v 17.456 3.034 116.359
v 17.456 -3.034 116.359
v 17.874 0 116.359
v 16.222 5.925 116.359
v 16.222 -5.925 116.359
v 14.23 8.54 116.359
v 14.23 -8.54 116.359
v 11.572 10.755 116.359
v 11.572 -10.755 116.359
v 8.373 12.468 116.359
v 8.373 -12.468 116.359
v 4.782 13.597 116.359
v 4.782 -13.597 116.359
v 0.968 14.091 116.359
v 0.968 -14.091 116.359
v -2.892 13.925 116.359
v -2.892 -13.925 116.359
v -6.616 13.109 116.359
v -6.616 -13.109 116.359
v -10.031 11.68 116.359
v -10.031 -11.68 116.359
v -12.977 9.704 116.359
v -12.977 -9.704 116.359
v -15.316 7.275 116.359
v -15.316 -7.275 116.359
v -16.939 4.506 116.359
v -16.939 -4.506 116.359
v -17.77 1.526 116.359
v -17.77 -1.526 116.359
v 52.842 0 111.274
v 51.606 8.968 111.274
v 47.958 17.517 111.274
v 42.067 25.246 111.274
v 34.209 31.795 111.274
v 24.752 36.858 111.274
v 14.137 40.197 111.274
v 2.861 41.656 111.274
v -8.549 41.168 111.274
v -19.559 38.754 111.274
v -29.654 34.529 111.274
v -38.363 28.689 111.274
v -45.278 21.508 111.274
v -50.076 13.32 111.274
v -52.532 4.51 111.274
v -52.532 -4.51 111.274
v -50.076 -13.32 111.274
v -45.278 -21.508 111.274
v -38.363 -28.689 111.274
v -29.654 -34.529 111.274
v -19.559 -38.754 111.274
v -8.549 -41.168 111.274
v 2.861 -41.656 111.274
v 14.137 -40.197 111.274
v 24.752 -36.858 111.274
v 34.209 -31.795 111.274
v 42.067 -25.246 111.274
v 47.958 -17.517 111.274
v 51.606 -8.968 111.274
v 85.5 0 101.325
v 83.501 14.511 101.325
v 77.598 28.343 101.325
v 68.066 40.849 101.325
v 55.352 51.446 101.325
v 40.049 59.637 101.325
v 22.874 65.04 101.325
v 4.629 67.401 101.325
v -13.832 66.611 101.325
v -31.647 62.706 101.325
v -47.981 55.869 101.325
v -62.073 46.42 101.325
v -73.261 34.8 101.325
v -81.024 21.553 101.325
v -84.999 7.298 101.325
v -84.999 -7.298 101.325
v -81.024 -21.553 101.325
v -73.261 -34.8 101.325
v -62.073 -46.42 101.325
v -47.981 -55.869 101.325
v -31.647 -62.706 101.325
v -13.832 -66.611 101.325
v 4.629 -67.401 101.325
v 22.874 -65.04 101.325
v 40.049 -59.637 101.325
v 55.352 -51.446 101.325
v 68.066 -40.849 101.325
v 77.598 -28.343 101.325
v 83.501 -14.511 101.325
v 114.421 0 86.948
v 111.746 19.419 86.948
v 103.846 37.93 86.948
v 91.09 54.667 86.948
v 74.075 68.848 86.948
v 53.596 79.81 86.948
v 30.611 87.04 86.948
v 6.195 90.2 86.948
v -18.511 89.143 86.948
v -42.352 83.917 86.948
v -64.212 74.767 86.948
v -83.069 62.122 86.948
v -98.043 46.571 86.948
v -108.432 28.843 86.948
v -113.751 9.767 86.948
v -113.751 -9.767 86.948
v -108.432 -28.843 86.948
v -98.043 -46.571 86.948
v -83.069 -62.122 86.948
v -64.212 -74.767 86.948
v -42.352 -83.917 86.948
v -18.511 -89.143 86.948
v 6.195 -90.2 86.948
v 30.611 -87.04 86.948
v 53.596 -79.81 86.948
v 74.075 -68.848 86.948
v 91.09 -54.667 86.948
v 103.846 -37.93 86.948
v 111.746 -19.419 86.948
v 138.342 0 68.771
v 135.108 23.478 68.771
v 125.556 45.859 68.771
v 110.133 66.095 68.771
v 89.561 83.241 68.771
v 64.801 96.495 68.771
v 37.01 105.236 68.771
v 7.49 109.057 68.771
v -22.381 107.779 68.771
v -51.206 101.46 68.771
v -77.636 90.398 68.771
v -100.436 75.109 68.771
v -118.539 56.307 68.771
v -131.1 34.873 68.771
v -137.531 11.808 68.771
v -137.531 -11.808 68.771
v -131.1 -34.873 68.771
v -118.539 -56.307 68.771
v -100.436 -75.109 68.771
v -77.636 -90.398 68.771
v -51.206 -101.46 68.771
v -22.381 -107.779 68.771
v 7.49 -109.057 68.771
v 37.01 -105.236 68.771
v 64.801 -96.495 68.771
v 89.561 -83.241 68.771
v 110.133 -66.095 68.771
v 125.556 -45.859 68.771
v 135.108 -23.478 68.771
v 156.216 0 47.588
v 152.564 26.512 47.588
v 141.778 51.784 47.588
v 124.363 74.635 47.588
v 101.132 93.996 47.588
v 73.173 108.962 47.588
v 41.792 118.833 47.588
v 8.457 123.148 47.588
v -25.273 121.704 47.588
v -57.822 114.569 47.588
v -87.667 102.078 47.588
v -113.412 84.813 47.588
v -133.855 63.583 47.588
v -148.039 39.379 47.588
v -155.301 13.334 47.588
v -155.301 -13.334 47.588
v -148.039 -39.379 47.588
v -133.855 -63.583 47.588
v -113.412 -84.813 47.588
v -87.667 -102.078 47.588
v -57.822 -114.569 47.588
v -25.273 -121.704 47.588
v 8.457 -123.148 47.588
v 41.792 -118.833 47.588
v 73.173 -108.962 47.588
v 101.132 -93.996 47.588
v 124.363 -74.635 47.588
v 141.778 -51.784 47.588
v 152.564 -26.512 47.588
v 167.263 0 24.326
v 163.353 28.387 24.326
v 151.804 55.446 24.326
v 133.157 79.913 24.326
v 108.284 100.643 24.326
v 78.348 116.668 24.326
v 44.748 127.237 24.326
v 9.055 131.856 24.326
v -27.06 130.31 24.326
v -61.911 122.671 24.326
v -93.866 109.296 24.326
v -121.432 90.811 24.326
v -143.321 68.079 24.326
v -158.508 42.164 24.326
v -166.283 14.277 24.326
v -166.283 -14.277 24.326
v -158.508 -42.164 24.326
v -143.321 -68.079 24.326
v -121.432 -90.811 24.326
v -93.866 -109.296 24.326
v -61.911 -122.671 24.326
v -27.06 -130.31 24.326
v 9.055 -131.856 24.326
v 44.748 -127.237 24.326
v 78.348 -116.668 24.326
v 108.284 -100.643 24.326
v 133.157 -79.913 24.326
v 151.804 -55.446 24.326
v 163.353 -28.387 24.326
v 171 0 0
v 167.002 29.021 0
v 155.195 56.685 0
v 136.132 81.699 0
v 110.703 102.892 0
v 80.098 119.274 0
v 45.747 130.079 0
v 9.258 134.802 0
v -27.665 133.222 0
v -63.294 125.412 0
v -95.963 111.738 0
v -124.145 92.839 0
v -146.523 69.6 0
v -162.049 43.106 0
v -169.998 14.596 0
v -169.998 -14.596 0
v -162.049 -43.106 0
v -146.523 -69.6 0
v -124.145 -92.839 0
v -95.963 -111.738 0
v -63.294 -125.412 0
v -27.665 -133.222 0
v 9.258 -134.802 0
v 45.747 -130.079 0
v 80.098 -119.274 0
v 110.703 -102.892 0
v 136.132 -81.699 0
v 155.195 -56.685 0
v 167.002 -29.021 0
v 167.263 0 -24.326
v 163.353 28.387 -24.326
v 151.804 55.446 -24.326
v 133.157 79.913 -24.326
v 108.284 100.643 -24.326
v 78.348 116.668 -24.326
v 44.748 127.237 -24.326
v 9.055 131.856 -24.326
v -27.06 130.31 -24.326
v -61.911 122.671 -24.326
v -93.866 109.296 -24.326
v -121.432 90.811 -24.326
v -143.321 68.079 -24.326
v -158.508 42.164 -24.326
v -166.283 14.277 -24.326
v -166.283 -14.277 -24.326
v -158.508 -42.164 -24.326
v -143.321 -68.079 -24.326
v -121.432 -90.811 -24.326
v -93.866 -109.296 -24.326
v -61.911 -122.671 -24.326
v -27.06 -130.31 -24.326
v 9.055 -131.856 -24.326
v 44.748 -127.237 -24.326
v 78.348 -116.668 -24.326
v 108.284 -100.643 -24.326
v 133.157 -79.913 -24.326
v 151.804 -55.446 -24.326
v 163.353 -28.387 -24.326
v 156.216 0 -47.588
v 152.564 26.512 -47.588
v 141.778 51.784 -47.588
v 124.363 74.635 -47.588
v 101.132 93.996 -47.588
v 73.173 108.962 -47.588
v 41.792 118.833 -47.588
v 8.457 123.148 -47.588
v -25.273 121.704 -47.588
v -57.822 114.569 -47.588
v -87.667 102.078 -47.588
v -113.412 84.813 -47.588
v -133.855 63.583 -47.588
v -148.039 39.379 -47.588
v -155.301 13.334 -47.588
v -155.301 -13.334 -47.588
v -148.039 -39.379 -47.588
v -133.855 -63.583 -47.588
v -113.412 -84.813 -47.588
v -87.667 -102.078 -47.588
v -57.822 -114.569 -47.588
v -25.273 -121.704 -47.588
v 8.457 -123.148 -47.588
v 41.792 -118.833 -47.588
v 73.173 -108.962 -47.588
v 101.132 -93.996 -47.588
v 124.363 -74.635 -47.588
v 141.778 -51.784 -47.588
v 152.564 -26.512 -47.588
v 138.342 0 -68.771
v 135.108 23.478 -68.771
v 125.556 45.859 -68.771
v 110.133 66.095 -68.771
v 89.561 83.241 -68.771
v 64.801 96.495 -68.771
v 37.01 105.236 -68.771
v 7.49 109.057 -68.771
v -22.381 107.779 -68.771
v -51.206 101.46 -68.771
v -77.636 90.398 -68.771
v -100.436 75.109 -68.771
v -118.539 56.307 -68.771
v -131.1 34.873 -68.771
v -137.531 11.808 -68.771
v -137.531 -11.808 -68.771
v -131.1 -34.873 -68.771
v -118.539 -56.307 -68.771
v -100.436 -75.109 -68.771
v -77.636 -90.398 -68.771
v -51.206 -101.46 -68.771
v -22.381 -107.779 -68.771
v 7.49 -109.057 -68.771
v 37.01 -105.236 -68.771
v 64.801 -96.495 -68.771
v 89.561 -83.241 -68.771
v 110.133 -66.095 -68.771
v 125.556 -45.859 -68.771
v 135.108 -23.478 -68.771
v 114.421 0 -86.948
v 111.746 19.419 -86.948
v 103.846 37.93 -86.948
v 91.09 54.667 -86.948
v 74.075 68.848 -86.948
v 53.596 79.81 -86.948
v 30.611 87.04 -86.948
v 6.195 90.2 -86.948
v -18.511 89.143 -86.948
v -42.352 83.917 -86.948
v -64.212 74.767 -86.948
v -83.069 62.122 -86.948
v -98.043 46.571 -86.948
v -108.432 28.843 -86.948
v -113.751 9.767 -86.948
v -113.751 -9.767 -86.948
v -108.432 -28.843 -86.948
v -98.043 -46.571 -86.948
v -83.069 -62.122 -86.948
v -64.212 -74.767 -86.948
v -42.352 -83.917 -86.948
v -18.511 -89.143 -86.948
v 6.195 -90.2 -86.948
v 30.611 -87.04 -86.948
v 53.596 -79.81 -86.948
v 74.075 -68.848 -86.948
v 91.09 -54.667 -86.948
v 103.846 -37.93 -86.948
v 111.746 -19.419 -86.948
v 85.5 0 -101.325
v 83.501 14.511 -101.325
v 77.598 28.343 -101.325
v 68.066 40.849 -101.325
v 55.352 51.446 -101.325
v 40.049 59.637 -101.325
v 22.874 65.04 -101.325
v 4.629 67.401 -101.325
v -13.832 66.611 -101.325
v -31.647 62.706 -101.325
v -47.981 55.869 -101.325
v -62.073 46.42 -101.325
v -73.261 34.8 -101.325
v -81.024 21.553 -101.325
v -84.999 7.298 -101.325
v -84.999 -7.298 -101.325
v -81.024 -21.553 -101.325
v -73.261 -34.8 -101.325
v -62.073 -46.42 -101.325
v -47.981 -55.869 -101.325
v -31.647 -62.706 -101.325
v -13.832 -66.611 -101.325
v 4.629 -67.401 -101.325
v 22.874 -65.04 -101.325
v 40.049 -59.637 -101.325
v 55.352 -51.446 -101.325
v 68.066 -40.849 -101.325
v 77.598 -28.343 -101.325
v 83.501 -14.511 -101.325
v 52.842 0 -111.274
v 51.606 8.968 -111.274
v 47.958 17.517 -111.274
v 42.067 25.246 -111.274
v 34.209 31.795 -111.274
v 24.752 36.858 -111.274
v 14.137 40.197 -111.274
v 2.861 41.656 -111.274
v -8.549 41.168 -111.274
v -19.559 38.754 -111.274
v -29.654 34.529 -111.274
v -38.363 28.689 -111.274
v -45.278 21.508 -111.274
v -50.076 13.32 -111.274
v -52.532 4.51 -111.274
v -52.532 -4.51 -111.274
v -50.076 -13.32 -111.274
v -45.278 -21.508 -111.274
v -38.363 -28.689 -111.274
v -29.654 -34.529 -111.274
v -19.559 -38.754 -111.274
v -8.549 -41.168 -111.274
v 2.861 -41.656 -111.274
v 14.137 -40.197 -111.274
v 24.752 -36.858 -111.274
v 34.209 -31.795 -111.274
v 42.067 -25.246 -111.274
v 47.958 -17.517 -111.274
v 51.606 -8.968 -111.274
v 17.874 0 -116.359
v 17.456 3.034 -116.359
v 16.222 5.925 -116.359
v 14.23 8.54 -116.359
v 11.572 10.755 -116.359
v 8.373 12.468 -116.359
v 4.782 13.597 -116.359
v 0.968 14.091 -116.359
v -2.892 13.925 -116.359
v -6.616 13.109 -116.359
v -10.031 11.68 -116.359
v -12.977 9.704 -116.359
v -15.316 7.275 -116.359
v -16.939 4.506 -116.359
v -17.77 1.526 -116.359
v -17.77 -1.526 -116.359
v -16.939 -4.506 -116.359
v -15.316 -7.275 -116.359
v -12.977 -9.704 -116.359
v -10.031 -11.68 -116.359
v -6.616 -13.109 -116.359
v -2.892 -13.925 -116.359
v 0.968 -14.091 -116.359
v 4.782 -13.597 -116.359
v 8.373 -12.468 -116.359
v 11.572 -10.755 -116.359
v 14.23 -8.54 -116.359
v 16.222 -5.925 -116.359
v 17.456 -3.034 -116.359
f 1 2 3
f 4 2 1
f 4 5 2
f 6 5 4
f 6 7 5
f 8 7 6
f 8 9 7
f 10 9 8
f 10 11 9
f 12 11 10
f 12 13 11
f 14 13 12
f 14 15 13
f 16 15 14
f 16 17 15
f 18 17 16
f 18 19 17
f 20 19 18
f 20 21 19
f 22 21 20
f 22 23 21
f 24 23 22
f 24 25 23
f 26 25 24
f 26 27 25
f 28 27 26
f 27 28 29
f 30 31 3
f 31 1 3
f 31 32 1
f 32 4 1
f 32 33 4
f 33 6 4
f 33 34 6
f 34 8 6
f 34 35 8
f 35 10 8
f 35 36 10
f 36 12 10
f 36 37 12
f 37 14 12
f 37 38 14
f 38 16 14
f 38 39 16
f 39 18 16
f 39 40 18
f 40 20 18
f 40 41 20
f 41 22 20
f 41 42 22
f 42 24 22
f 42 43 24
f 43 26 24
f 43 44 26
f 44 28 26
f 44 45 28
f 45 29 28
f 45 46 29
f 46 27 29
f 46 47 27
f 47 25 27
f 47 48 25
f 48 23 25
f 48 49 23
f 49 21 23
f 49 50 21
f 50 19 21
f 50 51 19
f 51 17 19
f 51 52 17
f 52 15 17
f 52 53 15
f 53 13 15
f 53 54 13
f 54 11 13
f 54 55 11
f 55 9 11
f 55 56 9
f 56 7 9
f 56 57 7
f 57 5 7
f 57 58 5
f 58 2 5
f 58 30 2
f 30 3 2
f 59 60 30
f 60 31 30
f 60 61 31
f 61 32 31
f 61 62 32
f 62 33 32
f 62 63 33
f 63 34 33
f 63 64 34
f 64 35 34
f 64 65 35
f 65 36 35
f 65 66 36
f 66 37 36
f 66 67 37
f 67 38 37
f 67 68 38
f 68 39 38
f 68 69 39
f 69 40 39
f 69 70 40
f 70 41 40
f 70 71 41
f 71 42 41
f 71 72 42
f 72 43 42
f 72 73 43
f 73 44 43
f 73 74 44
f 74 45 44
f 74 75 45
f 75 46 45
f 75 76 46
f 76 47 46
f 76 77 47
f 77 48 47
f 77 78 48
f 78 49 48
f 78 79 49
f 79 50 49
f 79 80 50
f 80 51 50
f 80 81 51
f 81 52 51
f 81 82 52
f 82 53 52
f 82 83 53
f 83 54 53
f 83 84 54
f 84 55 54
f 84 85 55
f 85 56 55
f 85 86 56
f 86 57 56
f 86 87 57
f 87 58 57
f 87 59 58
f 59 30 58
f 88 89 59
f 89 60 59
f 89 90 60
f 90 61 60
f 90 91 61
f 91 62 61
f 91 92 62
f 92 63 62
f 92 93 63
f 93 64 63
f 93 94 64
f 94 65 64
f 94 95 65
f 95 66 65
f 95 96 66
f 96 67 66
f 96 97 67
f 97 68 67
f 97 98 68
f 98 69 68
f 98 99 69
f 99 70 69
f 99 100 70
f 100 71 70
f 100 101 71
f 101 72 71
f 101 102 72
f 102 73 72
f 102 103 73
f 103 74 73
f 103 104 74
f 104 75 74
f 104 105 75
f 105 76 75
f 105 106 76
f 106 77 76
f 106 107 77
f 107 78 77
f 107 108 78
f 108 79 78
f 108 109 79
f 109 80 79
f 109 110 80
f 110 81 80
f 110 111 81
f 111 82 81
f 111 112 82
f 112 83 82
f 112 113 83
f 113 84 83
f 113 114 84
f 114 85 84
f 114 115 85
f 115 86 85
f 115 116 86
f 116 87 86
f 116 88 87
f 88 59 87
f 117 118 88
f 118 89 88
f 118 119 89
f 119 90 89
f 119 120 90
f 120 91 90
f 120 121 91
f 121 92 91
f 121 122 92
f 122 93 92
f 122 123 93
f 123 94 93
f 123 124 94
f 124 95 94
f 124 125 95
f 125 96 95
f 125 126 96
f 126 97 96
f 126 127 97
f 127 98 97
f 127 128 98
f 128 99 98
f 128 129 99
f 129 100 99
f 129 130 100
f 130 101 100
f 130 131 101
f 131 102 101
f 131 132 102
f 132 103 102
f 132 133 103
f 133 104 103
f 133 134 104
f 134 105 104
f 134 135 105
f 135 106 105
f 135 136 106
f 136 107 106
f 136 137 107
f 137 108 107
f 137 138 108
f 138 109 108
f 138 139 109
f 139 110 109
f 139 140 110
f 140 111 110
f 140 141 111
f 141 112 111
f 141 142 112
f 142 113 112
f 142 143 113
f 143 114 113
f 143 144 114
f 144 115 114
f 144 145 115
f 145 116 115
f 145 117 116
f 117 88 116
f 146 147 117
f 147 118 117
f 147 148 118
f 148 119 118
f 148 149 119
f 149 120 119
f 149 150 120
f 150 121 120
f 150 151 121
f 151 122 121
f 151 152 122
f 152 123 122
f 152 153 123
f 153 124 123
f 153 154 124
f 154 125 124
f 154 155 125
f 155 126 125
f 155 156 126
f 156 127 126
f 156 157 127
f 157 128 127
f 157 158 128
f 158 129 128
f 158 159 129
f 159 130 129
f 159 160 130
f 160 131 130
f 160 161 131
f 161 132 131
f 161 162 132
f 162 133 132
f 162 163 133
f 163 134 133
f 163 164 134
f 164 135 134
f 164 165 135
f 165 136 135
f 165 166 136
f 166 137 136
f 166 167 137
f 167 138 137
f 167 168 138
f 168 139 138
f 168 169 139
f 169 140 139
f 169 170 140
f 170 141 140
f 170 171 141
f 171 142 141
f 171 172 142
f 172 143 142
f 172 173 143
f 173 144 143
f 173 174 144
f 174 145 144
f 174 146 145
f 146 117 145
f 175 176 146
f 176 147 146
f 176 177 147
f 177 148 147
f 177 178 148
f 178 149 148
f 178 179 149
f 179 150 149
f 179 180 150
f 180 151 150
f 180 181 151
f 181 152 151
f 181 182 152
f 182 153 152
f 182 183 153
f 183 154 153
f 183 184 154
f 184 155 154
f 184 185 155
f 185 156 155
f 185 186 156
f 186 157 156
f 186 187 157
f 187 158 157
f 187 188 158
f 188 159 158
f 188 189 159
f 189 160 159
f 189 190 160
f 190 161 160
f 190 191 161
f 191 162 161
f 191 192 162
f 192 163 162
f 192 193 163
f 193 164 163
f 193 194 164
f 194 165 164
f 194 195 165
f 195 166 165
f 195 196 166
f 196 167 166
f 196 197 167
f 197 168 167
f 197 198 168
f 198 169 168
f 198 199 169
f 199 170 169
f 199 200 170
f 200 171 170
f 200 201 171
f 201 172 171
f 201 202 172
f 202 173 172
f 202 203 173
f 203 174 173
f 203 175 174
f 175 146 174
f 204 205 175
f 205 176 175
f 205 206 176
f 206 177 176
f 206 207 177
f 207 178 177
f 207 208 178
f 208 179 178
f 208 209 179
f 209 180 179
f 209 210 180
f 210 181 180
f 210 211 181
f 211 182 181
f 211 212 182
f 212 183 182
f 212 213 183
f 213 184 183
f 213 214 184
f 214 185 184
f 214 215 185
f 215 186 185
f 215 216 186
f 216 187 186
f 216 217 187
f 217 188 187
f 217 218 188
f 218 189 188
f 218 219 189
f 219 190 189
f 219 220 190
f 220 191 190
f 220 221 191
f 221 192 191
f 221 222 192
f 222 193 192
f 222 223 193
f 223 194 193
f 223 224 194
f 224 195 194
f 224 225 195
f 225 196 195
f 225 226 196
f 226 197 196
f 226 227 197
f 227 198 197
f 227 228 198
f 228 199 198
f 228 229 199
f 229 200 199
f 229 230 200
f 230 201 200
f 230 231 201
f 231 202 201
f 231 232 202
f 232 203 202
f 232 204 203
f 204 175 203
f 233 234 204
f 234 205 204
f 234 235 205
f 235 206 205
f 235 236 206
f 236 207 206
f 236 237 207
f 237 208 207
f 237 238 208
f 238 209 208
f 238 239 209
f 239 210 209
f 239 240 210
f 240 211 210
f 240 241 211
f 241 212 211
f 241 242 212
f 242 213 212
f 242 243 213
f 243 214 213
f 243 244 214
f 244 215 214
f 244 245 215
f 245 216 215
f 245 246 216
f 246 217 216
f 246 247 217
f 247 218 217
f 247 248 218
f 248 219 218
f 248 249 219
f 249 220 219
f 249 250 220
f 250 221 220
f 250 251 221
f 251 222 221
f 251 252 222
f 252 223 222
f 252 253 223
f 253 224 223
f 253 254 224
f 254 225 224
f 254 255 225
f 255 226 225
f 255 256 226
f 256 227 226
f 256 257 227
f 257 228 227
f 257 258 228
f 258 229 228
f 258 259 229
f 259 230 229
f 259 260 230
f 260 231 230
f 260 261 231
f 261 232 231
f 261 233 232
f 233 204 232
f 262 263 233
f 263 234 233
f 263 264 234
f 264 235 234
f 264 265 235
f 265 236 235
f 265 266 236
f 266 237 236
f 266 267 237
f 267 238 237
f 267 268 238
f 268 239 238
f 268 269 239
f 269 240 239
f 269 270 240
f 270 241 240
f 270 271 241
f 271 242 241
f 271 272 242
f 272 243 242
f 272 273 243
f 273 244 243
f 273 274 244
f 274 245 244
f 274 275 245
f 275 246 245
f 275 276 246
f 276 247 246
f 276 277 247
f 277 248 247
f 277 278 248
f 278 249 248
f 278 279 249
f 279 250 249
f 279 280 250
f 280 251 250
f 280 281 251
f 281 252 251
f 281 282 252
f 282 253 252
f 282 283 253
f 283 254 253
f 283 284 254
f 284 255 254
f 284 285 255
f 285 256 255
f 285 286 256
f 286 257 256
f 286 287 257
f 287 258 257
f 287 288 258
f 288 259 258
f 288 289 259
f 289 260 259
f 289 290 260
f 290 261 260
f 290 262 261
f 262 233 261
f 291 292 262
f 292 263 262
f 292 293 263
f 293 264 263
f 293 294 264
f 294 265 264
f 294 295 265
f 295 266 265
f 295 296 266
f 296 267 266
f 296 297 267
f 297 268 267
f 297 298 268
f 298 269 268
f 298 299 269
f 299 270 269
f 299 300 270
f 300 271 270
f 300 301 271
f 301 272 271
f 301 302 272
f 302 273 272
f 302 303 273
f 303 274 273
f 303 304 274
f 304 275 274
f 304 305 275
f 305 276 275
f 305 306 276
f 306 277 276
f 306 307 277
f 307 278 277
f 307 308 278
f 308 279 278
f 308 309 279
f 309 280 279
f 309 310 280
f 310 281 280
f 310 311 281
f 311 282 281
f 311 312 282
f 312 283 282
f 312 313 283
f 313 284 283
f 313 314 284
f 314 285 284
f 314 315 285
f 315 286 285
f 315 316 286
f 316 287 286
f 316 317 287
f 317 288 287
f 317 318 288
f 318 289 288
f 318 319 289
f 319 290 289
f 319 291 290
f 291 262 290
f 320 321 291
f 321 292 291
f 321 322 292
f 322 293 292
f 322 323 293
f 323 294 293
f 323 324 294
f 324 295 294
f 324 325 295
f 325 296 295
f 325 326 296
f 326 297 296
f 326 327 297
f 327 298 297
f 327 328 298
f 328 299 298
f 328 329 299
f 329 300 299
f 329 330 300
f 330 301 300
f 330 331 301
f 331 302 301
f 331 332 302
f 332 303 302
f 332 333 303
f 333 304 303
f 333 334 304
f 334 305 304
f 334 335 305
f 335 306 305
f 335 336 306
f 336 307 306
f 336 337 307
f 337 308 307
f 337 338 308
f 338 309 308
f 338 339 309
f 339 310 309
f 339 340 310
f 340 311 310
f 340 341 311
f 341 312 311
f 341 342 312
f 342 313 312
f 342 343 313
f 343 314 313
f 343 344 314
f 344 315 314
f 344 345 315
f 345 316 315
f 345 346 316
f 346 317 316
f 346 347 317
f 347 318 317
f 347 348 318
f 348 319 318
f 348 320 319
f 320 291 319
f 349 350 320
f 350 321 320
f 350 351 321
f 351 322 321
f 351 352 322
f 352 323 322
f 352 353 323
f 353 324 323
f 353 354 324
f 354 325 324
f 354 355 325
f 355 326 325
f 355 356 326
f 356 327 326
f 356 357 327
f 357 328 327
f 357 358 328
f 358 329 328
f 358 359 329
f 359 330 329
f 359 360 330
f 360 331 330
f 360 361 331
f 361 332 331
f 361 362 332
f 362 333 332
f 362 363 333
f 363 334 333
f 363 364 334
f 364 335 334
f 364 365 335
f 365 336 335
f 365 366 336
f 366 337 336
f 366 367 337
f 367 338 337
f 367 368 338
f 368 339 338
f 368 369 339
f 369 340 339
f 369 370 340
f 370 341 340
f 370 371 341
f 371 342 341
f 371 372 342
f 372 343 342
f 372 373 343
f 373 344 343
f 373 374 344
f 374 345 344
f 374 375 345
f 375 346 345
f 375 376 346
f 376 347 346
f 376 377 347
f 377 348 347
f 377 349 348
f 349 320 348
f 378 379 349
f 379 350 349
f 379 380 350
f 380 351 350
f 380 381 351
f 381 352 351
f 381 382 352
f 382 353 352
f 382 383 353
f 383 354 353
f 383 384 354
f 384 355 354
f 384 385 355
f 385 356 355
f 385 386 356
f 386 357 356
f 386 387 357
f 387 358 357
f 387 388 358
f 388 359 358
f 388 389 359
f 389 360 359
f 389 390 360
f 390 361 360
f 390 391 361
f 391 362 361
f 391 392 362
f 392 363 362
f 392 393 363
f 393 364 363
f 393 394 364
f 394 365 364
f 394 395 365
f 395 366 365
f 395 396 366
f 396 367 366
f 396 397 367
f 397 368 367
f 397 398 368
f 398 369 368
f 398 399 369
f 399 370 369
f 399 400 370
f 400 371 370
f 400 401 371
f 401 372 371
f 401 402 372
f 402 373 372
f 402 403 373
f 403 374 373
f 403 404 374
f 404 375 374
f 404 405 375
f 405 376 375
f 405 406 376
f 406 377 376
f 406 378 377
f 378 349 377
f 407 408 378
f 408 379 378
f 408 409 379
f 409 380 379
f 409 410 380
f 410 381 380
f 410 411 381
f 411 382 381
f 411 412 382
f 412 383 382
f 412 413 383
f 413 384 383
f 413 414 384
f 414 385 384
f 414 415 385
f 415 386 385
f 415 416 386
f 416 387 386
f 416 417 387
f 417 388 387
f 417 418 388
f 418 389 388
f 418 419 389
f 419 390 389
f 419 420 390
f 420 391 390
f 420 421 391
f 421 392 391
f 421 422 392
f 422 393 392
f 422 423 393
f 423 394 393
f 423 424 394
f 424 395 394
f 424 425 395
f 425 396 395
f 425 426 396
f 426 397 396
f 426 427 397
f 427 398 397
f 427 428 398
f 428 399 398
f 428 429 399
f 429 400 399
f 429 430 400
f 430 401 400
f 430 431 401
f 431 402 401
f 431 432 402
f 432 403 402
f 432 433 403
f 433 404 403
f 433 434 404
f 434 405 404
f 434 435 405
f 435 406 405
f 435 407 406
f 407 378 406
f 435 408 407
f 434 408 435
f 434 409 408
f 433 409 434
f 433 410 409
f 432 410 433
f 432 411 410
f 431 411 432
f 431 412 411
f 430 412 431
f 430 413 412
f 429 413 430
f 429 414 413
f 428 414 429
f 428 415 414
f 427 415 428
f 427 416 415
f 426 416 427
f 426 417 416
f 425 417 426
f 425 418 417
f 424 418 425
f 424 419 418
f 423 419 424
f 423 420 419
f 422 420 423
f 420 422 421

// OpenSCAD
// Generated by SolidPython 1.0.1 on 2020-07-29 00:46:54


scale(v = [19, 15, 13]) {
	sphere(r = 9);
}
/***********************************************
*********      SolidPython code:      **********
************************************************
 
# import packages: SolidPython
from solid import *
from solid.utils import *
from itertools import chain, combinations, permutations


class Resize:

    def __init__(self, scad_file):
        self.scad_file = scad_file
        #self.scad_file = import_scad(scad_file)
        # cone/cylinder param:
        self.r1 = 0
        self.r2 = 0
        self.h = 0
        # rectangular prism param:
        self.w = 0
        self.l = 0
        # ellipse param:
        self.r = 0

    # import OpenScad code (file name corresponds to shape)


    # classify shape + parameters
    def assign(self, param1, param2, param3):
        if self.scad_file == 'cone.scad':
            self.r1 = param1
            self.r2 = param2
            self.h = param3
        elif self.scad_file == 'cylinder.scad':
            self.r1 = param1
            self.r2 = param2
            self.h = param3
        elif self.scad_file == 'rectangularPrism.scad':
            self.h = param1
            self.l = param2
            self.w = param3
        else:
            self.r = param1
            self.h = param2

    # resize parameters
    def iterate(self):
        x = range(3, 20, 2)
        i = 1
        if self.scad_file == 'cone.scad':
            tempList = list(permutations(x, 2))
            for temp in tempList:
                param1 = temp[0]
                param2 = temp[1]
                filepath = 'produced_scad_files/' + 'cone' + str(param1) + '_' + str(param2) + '_' + '.scad'
                scad_render_to_file(cylinder(h=param1, r1=param2, r2=0), filepath)

        elif self.scad_file == 'cylinder.scad':
            tempList = list(permutations(x, 3))
            for temp in tempList:
                param1 = temp[0]
                param2 = temp[1]
                filepath = 'produced_scad_files/' + 'cylinder' + str(param1) + '_' + str(param2) + '_' + '.scad'
                scad_render_to_file(cylinder(h=param1, r1=param2, r2=param2), filepath)

        elif self.scad_file == 'rectangularPrism.scad':
            tempList = list(permutations(x, 3))
            for temp in tempList:
                param1 = temp[0]
                param2 = temp[1]
                param3 = temp[2]
                filepath = 'produced_scad_files/' + 'rectangularPrism' + str(param1) + '_' + str(param2) + '_' + str(
                    param3) + '.scad'
                scad_render_to_file(cube(size=(param1, param2, param3)), filepath)

        elif self.scad_file == 'ellipse.scad':
            tempList = list(permutations(x, 4))
            for temp in tempList:
                param1 = temp[0]
                param2 = temp[1]
                param3 = temp[2]
                param4 = temp[3]
                filepath = 'produced_scad_files/' + 'ellipse' + str(param1) + '_' + str(param2) + '_' + str(param3) + '_' + str(param4) + '.scad'
                scad_render_to_file(scale([param1, param2, param3])(sphere(r=param4)), filepath)

    def render_to_scadfile(self):
        scad_render_to_file(scad, 'example.scad') 
 
************************************************/
